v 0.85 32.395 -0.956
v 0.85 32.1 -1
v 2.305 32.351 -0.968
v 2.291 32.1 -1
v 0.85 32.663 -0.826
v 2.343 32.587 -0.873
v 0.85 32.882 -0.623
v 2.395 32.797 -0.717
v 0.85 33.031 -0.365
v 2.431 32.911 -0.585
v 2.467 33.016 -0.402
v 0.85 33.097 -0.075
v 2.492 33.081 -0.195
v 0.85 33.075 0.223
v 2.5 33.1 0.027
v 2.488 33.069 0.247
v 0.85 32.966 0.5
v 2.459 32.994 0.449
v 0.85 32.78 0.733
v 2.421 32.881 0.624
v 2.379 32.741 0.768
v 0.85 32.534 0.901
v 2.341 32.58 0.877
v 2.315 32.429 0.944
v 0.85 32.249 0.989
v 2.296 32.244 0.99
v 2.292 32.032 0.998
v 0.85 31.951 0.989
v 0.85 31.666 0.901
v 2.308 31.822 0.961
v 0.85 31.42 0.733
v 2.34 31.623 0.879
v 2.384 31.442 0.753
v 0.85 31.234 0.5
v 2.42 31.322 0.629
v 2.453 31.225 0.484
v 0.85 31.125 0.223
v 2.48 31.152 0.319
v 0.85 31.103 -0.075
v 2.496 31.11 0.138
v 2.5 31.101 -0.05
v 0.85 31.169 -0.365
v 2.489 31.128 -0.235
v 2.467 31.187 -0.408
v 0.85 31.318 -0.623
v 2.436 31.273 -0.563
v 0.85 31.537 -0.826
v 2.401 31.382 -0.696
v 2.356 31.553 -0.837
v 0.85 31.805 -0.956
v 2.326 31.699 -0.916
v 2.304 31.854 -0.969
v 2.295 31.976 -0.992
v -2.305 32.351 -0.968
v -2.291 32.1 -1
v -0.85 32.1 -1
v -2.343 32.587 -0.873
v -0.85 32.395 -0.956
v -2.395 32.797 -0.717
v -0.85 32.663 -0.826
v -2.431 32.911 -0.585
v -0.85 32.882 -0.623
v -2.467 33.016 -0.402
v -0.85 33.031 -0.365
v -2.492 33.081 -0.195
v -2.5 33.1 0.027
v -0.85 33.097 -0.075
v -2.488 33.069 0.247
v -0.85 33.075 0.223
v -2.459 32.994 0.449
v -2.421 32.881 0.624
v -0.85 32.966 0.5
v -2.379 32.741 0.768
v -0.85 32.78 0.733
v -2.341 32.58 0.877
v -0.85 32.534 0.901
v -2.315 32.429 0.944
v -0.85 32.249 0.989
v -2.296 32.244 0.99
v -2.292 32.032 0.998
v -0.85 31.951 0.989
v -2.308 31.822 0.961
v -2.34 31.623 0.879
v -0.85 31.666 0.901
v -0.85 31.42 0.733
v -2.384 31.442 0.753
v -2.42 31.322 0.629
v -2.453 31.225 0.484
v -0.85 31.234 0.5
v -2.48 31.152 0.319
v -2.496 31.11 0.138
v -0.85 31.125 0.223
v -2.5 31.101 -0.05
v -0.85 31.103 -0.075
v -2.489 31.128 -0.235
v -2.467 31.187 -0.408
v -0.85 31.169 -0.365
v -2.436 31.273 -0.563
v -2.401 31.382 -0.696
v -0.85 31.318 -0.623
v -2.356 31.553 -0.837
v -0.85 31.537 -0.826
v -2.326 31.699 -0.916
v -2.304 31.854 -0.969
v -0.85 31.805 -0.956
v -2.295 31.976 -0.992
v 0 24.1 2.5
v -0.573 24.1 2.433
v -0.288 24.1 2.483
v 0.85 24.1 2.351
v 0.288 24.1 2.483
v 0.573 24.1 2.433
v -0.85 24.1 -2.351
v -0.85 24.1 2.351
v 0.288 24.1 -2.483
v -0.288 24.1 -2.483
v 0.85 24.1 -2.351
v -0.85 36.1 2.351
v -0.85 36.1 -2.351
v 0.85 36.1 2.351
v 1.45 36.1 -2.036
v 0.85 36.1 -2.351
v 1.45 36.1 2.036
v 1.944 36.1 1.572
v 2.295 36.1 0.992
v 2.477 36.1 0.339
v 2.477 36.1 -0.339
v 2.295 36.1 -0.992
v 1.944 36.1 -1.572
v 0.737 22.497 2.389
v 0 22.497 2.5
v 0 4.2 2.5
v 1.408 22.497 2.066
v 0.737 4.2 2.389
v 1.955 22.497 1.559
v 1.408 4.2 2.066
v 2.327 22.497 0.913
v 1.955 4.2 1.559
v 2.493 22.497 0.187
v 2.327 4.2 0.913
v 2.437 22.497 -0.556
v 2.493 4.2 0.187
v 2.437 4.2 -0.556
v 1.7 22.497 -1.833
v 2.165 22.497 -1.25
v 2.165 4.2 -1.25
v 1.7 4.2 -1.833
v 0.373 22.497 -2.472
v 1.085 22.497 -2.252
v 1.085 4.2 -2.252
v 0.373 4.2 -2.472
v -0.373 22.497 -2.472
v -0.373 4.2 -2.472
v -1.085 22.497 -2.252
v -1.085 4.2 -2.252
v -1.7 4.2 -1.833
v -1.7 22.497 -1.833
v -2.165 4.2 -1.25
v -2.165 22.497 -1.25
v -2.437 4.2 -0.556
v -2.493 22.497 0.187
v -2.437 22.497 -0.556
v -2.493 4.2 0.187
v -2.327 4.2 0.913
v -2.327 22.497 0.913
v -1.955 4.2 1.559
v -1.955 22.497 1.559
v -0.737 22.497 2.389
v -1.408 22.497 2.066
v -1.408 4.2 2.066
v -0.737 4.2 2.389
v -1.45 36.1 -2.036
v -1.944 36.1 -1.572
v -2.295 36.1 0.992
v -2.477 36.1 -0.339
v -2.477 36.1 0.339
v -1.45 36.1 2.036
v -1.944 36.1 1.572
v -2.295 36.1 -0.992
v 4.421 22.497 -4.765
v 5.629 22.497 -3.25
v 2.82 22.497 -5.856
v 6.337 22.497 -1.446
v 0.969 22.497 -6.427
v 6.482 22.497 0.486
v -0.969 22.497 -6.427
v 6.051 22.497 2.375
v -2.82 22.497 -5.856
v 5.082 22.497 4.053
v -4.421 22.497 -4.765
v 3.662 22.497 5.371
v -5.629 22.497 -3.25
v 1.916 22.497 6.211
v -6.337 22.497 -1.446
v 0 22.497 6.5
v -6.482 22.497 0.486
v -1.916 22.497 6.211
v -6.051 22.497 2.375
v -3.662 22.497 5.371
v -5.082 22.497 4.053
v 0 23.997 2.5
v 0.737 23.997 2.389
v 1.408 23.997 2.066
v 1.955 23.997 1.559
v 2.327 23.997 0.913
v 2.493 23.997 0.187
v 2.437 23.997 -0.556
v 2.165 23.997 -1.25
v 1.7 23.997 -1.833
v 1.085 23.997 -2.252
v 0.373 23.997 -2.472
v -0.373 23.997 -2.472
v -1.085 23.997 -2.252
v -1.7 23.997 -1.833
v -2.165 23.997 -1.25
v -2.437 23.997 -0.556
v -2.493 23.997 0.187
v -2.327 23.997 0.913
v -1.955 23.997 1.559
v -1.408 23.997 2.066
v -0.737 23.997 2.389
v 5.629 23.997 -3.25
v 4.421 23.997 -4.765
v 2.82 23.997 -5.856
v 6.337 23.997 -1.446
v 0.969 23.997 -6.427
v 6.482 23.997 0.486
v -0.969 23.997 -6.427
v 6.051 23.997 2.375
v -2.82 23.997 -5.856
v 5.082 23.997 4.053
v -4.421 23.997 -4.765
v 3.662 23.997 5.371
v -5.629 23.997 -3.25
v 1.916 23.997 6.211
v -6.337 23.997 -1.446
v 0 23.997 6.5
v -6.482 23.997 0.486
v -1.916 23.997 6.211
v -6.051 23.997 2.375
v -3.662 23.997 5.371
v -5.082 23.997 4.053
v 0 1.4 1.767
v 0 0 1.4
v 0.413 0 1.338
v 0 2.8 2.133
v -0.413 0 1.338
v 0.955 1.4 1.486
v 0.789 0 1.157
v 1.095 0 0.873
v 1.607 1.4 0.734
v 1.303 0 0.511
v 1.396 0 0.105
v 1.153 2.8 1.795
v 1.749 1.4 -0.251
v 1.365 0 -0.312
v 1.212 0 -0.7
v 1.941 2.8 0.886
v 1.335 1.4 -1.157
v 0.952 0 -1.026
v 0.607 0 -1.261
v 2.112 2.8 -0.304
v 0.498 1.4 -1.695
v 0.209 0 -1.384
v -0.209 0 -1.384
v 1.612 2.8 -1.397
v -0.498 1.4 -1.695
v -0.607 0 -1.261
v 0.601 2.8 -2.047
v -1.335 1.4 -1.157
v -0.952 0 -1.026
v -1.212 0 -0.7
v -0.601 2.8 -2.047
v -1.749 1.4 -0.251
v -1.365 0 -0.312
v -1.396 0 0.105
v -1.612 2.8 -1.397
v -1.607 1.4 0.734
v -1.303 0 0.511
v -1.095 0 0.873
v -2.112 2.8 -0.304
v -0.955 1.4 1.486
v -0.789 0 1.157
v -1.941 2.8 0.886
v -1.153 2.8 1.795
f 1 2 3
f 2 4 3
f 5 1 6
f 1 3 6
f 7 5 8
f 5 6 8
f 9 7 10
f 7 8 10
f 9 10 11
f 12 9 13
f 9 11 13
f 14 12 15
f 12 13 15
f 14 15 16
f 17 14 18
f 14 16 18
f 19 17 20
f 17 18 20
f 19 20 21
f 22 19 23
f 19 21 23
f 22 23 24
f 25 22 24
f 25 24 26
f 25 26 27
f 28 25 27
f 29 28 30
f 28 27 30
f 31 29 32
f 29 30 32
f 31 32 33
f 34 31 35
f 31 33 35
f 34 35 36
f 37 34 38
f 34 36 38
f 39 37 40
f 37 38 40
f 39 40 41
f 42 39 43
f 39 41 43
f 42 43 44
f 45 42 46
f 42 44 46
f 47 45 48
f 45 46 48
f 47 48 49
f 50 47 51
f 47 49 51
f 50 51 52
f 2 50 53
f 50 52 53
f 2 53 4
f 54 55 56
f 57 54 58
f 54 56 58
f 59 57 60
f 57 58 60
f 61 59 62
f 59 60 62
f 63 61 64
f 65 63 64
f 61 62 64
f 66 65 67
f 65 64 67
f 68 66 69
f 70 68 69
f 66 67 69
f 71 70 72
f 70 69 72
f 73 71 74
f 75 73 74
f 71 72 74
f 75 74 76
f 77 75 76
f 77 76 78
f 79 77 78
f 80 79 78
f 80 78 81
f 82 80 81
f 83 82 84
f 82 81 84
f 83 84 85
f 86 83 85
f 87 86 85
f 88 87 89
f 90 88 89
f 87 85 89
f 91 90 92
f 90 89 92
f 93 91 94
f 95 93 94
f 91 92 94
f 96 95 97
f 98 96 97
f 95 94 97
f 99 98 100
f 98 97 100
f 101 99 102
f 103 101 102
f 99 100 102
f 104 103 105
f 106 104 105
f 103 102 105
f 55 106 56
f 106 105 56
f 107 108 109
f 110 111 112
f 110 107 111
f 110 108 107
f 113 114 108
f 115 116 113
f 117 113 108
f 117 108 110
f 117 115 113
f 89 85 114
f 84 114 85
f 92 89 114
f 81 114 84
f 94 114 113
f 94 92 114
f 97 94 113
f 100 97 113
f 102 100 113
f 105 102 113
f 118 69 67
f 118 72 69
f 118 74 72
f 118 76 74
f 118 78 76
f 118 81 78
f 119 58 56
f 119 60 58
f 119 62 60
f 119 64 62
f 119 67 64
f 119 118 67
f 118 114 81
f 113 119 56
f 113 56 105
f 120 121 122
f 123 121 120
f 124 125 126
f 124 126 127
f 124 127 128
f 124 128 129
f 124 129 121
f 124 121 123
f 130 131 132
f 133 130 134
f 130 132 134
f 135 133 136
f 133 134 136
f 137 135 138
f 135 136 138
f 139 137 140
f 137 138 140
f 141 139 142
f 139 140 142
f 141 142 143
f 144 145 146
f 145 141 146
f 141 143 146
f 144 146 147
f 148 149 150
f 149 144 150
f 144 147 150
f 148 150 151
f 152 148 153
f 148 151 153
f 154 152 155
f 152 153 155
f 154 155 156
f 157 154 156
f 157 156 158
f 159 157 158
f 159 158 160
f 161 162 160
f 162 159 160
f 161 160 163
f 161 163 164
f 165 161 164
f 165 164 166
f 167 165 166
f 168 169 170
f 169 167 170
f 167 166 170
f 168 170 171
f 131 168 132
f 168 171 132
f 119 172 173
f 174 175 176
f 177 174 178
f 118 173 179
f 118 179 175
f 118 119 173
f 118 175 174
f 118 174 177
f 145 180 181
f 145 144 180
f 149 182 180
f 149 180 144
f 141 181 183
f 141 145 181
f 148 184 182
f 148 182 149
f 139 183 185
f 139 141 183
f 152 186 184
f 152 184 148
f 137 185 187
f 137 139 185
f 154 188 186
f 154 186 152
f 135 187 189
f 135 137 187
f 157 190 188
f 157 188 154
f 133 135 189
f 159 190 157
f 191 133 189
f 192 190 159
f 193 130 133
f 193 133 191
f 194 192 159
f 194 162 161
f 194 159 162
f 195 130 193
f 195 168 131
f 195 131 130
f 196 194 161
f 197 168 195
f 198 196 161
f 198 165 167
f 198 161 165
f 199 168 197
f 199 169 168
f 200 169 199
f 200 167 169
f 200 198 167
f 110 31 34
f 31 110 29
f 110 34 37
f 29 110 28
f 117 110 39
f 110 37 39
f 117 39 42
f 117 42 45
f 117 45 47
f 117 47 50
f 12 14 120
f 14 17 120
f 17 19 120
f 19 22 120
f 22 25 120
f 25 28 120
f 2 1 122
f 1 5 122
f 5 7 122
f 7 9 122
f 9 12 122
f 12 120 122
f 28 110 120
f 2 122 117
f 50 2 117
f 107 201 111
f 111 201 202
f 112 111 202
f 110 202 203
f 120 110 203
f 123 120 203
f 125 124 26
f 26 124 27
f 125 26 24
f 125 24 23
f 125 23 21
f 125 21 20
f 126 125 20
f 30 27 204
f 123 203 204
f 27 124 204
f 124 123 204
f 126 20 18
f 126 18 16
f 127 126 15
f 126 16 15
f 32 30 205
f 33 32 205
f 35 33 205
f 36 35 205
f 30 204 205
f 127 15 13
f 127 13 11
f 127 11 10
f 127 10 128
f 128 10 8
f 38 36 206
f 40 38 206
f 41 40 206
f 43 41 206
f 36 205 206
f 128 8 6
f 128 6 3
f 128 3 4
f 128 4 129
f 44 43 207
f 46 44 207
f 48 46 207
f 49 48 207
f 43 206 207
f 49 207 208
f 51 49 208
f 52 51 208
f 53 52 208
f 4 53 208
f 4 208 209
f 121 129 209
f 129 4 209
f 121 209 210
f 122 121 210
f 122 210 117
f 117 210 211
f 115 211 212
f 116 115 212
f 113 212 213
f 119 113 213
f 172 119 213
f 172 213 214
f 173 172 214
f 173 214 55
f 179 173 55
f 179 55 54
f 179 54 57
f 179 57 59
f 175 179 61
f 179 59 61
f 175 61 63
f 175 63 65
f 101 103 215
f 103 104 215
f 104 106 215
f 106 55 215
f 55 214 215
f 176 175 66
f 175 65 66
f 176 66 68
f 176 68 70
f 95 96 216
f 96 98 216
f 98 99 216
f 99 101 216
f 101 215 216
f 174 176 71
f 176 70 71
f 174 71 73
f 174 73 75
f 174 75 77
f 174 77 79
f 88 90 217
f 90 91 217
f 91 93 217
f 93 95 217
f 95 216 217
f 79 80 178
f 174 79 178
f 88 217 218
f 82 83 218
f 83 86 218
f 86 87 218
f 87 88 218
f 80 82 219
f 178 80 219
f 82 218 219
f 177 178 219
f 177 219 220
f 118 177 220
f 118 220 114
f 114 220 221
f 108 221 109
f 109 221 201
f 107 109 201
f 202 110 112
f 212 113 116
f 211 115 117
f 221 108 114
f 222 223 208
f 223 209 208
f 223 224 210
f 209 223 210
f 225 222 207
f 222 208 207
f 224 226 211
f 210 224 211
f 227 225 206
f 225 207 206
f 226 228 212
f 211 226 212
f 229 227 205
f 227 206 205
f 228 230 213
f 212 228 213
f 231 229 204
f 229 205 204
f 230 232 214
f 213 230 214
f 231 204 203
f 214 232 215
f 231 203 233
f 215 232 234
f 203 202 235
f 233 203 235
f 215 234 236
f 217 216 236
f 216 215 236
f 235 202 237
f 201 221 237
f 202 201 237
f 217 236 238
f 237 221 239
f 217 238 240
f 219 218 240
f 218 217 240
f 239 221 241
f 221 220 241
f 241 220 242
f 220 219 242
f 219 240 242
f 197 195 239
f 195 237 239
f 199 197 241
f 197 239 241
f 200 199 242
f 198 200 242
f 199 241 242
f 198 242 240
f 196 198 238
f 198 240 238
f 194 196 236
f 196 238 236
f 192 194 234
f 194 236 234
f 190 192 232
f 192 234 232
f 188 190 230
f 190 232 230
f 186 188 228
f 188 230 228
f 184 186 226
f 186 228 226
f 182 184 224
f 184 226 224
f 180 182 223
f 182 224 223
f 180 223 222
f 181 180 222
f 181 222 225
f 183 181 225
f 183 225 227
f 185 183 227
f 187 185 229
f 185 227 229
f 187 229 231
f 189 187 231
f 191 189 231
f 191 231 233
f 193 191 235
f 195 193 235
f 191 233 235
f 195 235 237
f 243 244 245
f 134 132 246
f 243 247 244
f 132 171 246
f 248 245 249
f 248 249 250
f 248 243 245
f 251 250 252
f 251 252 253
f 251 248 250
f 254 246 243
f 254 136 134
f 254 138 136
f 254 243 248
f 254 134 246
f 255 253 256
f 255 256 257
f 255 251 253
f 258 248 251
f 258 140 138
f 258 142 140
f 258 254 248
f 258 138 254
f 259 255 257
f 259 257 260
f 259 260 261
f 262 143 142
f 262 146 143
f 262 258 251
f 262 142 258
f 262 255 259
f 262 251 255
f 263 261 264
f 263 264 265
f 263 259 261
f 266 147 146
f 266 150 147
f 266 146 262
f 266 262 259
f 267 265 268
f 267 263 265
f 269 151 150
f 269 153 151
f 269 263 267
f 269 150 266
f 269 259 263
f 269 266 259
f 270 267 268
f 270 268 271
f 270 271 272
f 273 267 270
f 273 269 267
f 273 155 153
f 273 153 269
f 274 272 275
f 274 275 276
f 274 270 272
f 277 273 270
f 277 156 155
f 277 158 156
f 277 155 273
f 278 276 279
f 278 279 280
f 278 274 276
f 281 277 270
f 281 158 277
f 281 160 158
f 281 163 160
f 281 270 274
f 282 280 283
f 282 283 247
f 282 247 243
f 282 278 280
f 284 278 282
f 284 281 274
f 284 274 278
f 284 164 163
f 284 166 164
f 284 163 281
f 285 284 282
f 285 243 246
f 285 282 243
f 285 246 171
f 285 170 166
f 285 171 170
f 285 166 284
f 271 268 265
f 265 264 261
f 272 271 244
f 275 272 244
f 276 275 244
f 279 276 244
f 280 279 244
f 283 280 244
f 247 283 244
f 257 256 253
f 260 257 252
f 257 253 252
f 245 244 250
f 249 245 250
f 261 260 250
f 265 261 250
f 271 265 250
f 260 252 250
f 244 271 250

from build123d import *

# Parameters (mm, degrees)
SKETCH1_R           = 2.5
BOSS_EXTRUDE1_DEPTH = 36.1
SKETCH2_W           = 1.7
SKETCH2_H           = 6.818294784
CUT_EXTRUDE1_DEPTH  = 12
SKETCH3_R           = 1
CUT_EXTRUDE2_DEPTH  = 6
CHAMFER1_SIZE       = 1.1
CHAMFER1_SIZE2      = 4.2
SKETCH5_W           = 4
SKETCH5_H           = 1.5


with BuildPart() as part:
    # Sketch1 → Boss-Extrude1 (new body)
    with BuildSketch(Plane(origin=(0, 0, 0), x_dir=(1, 0, 0), z_dir=(0, 1, 0))):
        with Locations(Location((0, 0, 0), (0, 0, 270))):
            Circle(SKETCH1_R)
    extrude(amount=BOSS_EXTRUDE1_DEPTH)

    # Sketch2 → Cut-Extrude1 (cut)
    with BuildSketch(Plane(origin=(0, 36.1, 0), x_dir=(1, 0, 0), z_dir=(0, 1, 0))):
        Rectangle(SKETCH2_W, SKETCH2_H)
    extrude(amount=-CUT_EXTRUDE1_DEPTH, mode=Mode.SUBTRACT)

    # Sketch3 → Cut-Extrude2 (cut, symmetric)
    with BuildSketch(Plane(origin=(-0.85, 0, 0), x_dir=(0, 0, -1), z_dir=(1, 0, 0))):
        with Locations((0, 32.1)):
            Circle(SKETCH3_R)
    extrude(amount=CUT_EXTRUDE2_DEPTH, both=True, mode=Mode.SUBTRACT)

    # Chamfer1
    chamfer1_edges = [part.edges().sort_by_distance(p)[0] for p in [
        (0, 0, -2.5),
    ]]
    chamfer1_side = [part.faces().sort_by_distance(p)[0] for p in [
        (0, 0, 0),
    ]]
    chamfer(chamfer1_edges, length=CHAMFER1_SIZE, length2=CHAMFER1_SIZE2, reference=chamfer1_side[0])

    # Sketch5 → Revolve1 (revolve)
    with BuildSketch(Plane(origin=(0, 0, 0), x_dir=(0, 0, -1), z_dir=(1, 0, 0))):
        with Locations((-4.5, 23.247432375)):
            Rectangle(SKETCH5_W, SKETCH5_H)
    revolve(axis=Axis((0, 50, 0), (0, -1, 0)))


solid = part.part
